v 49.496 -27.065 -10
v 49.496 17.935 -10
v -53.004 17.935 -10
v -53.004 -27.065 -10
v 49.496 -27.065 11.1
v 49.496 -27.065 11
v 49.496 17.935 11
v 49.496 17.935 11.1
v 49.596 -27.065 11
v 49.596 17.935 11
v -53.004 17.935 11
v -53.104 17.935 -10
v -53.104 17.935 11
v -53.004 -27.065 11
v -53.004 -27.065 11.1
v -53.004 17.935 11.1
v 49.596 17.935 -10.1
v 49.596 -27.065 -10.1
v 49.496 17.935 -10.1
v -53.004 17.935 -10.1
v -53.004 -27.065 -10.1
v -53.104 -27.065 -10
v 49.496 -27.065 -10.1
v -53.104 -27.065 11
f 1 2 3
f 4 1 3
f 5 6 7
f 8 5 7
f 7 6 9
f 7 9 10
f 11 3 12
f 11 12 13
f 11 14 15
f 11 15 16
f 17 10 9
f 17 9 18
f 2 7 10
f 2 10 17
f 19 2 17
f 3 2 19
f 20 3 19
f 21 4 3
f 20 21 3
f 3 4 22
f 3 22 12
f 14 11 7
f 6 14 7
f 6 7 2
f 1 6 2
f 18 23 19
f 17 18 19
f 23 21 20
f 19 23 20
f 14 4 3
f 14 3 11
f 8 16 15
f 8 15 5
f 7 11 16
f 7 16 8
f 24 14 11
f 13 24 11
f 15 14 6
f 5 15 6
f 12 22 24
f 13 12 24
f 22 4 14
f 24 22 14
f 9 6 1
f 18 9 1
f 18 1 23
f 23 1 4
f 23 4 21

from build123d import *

# Parameters (mm, degrees)
CROQUIS1_W              = 102.500003815
CROQUIS1_H              = 45
SALIENTE_EXTRUIR1_DEPTH = 0.1
CROQUIS2_W              = 21.100000953
CROQUIS2_H              = 45
SALIENTE_EXTRUIR2_DEPTH = 0.1
CROQUIS3_W              = 102.500003815
CROQUIS3_H              = 45
SALIENTE_EXTRUIR3_DEPTH = 0.1
CROQUIS4_W              = 21.000000953
CROQUIS4_H              = 45
SALIENTE_EXTRUIR4_DEPTH = 0.1


with BuildPart() as part:
    # Croquis1 → Saliente-Extruir1 (new body)
    with BuildSketch(Plane(origin=(0, 0, -9.999999046), x_dir=(-1, 0, 0), z_dir=(0, 0, -1))):
        with Locations((1.753957749, -4.565101624)):
            Rectangle(CROQUIS1_W, CROQUIS1_H)
    extrude(amount=SALIENTE_EXTRUIR1_DEPTH)

    # Croquis2 → Saliente-Extruir2 (add)
    with BuildSketch(Plane(origin=(49.496044159, 0, 0), x_dir=(0, 0, -1), z_dir=(1, 0, 0))):
        with Locations((-0.450001431, -4.565101624)):
            Rectangle(CROQUIS2_W, CROQUIS2_H)
    extrude(amount=SALIENTE_EXTRUIR2_DEPTH)


with BuildPart() as body_2:
    # Croquis3 → Saliente-Extruir3 (new body)
    with BuildSketch(Plane.XY.offset(11.000001907)):
        with Locations((-1.753957749, -4.565101624)):
            Rectangle(CROQUIS3_W, CROQUIS3_H)
    extrude(amount=SALIENTE_EXTRUIR3_DEPTH)


with BuildPart() as body_3:
    # Croquis4 → Saliente-Extruir4 (new body)
    with BuildSketch(Plane.ZY.offset(53.003959656)):
        with Locations((0.500001431, -4.565101624)):
            Rectangle(CROQUIS4_W, CROQUIS4_H)
    extrude(amount=SALIENTE_EXTRUIR4_DEPTH)


solid = Compound([part.part, body_2.part, body_3.part])
